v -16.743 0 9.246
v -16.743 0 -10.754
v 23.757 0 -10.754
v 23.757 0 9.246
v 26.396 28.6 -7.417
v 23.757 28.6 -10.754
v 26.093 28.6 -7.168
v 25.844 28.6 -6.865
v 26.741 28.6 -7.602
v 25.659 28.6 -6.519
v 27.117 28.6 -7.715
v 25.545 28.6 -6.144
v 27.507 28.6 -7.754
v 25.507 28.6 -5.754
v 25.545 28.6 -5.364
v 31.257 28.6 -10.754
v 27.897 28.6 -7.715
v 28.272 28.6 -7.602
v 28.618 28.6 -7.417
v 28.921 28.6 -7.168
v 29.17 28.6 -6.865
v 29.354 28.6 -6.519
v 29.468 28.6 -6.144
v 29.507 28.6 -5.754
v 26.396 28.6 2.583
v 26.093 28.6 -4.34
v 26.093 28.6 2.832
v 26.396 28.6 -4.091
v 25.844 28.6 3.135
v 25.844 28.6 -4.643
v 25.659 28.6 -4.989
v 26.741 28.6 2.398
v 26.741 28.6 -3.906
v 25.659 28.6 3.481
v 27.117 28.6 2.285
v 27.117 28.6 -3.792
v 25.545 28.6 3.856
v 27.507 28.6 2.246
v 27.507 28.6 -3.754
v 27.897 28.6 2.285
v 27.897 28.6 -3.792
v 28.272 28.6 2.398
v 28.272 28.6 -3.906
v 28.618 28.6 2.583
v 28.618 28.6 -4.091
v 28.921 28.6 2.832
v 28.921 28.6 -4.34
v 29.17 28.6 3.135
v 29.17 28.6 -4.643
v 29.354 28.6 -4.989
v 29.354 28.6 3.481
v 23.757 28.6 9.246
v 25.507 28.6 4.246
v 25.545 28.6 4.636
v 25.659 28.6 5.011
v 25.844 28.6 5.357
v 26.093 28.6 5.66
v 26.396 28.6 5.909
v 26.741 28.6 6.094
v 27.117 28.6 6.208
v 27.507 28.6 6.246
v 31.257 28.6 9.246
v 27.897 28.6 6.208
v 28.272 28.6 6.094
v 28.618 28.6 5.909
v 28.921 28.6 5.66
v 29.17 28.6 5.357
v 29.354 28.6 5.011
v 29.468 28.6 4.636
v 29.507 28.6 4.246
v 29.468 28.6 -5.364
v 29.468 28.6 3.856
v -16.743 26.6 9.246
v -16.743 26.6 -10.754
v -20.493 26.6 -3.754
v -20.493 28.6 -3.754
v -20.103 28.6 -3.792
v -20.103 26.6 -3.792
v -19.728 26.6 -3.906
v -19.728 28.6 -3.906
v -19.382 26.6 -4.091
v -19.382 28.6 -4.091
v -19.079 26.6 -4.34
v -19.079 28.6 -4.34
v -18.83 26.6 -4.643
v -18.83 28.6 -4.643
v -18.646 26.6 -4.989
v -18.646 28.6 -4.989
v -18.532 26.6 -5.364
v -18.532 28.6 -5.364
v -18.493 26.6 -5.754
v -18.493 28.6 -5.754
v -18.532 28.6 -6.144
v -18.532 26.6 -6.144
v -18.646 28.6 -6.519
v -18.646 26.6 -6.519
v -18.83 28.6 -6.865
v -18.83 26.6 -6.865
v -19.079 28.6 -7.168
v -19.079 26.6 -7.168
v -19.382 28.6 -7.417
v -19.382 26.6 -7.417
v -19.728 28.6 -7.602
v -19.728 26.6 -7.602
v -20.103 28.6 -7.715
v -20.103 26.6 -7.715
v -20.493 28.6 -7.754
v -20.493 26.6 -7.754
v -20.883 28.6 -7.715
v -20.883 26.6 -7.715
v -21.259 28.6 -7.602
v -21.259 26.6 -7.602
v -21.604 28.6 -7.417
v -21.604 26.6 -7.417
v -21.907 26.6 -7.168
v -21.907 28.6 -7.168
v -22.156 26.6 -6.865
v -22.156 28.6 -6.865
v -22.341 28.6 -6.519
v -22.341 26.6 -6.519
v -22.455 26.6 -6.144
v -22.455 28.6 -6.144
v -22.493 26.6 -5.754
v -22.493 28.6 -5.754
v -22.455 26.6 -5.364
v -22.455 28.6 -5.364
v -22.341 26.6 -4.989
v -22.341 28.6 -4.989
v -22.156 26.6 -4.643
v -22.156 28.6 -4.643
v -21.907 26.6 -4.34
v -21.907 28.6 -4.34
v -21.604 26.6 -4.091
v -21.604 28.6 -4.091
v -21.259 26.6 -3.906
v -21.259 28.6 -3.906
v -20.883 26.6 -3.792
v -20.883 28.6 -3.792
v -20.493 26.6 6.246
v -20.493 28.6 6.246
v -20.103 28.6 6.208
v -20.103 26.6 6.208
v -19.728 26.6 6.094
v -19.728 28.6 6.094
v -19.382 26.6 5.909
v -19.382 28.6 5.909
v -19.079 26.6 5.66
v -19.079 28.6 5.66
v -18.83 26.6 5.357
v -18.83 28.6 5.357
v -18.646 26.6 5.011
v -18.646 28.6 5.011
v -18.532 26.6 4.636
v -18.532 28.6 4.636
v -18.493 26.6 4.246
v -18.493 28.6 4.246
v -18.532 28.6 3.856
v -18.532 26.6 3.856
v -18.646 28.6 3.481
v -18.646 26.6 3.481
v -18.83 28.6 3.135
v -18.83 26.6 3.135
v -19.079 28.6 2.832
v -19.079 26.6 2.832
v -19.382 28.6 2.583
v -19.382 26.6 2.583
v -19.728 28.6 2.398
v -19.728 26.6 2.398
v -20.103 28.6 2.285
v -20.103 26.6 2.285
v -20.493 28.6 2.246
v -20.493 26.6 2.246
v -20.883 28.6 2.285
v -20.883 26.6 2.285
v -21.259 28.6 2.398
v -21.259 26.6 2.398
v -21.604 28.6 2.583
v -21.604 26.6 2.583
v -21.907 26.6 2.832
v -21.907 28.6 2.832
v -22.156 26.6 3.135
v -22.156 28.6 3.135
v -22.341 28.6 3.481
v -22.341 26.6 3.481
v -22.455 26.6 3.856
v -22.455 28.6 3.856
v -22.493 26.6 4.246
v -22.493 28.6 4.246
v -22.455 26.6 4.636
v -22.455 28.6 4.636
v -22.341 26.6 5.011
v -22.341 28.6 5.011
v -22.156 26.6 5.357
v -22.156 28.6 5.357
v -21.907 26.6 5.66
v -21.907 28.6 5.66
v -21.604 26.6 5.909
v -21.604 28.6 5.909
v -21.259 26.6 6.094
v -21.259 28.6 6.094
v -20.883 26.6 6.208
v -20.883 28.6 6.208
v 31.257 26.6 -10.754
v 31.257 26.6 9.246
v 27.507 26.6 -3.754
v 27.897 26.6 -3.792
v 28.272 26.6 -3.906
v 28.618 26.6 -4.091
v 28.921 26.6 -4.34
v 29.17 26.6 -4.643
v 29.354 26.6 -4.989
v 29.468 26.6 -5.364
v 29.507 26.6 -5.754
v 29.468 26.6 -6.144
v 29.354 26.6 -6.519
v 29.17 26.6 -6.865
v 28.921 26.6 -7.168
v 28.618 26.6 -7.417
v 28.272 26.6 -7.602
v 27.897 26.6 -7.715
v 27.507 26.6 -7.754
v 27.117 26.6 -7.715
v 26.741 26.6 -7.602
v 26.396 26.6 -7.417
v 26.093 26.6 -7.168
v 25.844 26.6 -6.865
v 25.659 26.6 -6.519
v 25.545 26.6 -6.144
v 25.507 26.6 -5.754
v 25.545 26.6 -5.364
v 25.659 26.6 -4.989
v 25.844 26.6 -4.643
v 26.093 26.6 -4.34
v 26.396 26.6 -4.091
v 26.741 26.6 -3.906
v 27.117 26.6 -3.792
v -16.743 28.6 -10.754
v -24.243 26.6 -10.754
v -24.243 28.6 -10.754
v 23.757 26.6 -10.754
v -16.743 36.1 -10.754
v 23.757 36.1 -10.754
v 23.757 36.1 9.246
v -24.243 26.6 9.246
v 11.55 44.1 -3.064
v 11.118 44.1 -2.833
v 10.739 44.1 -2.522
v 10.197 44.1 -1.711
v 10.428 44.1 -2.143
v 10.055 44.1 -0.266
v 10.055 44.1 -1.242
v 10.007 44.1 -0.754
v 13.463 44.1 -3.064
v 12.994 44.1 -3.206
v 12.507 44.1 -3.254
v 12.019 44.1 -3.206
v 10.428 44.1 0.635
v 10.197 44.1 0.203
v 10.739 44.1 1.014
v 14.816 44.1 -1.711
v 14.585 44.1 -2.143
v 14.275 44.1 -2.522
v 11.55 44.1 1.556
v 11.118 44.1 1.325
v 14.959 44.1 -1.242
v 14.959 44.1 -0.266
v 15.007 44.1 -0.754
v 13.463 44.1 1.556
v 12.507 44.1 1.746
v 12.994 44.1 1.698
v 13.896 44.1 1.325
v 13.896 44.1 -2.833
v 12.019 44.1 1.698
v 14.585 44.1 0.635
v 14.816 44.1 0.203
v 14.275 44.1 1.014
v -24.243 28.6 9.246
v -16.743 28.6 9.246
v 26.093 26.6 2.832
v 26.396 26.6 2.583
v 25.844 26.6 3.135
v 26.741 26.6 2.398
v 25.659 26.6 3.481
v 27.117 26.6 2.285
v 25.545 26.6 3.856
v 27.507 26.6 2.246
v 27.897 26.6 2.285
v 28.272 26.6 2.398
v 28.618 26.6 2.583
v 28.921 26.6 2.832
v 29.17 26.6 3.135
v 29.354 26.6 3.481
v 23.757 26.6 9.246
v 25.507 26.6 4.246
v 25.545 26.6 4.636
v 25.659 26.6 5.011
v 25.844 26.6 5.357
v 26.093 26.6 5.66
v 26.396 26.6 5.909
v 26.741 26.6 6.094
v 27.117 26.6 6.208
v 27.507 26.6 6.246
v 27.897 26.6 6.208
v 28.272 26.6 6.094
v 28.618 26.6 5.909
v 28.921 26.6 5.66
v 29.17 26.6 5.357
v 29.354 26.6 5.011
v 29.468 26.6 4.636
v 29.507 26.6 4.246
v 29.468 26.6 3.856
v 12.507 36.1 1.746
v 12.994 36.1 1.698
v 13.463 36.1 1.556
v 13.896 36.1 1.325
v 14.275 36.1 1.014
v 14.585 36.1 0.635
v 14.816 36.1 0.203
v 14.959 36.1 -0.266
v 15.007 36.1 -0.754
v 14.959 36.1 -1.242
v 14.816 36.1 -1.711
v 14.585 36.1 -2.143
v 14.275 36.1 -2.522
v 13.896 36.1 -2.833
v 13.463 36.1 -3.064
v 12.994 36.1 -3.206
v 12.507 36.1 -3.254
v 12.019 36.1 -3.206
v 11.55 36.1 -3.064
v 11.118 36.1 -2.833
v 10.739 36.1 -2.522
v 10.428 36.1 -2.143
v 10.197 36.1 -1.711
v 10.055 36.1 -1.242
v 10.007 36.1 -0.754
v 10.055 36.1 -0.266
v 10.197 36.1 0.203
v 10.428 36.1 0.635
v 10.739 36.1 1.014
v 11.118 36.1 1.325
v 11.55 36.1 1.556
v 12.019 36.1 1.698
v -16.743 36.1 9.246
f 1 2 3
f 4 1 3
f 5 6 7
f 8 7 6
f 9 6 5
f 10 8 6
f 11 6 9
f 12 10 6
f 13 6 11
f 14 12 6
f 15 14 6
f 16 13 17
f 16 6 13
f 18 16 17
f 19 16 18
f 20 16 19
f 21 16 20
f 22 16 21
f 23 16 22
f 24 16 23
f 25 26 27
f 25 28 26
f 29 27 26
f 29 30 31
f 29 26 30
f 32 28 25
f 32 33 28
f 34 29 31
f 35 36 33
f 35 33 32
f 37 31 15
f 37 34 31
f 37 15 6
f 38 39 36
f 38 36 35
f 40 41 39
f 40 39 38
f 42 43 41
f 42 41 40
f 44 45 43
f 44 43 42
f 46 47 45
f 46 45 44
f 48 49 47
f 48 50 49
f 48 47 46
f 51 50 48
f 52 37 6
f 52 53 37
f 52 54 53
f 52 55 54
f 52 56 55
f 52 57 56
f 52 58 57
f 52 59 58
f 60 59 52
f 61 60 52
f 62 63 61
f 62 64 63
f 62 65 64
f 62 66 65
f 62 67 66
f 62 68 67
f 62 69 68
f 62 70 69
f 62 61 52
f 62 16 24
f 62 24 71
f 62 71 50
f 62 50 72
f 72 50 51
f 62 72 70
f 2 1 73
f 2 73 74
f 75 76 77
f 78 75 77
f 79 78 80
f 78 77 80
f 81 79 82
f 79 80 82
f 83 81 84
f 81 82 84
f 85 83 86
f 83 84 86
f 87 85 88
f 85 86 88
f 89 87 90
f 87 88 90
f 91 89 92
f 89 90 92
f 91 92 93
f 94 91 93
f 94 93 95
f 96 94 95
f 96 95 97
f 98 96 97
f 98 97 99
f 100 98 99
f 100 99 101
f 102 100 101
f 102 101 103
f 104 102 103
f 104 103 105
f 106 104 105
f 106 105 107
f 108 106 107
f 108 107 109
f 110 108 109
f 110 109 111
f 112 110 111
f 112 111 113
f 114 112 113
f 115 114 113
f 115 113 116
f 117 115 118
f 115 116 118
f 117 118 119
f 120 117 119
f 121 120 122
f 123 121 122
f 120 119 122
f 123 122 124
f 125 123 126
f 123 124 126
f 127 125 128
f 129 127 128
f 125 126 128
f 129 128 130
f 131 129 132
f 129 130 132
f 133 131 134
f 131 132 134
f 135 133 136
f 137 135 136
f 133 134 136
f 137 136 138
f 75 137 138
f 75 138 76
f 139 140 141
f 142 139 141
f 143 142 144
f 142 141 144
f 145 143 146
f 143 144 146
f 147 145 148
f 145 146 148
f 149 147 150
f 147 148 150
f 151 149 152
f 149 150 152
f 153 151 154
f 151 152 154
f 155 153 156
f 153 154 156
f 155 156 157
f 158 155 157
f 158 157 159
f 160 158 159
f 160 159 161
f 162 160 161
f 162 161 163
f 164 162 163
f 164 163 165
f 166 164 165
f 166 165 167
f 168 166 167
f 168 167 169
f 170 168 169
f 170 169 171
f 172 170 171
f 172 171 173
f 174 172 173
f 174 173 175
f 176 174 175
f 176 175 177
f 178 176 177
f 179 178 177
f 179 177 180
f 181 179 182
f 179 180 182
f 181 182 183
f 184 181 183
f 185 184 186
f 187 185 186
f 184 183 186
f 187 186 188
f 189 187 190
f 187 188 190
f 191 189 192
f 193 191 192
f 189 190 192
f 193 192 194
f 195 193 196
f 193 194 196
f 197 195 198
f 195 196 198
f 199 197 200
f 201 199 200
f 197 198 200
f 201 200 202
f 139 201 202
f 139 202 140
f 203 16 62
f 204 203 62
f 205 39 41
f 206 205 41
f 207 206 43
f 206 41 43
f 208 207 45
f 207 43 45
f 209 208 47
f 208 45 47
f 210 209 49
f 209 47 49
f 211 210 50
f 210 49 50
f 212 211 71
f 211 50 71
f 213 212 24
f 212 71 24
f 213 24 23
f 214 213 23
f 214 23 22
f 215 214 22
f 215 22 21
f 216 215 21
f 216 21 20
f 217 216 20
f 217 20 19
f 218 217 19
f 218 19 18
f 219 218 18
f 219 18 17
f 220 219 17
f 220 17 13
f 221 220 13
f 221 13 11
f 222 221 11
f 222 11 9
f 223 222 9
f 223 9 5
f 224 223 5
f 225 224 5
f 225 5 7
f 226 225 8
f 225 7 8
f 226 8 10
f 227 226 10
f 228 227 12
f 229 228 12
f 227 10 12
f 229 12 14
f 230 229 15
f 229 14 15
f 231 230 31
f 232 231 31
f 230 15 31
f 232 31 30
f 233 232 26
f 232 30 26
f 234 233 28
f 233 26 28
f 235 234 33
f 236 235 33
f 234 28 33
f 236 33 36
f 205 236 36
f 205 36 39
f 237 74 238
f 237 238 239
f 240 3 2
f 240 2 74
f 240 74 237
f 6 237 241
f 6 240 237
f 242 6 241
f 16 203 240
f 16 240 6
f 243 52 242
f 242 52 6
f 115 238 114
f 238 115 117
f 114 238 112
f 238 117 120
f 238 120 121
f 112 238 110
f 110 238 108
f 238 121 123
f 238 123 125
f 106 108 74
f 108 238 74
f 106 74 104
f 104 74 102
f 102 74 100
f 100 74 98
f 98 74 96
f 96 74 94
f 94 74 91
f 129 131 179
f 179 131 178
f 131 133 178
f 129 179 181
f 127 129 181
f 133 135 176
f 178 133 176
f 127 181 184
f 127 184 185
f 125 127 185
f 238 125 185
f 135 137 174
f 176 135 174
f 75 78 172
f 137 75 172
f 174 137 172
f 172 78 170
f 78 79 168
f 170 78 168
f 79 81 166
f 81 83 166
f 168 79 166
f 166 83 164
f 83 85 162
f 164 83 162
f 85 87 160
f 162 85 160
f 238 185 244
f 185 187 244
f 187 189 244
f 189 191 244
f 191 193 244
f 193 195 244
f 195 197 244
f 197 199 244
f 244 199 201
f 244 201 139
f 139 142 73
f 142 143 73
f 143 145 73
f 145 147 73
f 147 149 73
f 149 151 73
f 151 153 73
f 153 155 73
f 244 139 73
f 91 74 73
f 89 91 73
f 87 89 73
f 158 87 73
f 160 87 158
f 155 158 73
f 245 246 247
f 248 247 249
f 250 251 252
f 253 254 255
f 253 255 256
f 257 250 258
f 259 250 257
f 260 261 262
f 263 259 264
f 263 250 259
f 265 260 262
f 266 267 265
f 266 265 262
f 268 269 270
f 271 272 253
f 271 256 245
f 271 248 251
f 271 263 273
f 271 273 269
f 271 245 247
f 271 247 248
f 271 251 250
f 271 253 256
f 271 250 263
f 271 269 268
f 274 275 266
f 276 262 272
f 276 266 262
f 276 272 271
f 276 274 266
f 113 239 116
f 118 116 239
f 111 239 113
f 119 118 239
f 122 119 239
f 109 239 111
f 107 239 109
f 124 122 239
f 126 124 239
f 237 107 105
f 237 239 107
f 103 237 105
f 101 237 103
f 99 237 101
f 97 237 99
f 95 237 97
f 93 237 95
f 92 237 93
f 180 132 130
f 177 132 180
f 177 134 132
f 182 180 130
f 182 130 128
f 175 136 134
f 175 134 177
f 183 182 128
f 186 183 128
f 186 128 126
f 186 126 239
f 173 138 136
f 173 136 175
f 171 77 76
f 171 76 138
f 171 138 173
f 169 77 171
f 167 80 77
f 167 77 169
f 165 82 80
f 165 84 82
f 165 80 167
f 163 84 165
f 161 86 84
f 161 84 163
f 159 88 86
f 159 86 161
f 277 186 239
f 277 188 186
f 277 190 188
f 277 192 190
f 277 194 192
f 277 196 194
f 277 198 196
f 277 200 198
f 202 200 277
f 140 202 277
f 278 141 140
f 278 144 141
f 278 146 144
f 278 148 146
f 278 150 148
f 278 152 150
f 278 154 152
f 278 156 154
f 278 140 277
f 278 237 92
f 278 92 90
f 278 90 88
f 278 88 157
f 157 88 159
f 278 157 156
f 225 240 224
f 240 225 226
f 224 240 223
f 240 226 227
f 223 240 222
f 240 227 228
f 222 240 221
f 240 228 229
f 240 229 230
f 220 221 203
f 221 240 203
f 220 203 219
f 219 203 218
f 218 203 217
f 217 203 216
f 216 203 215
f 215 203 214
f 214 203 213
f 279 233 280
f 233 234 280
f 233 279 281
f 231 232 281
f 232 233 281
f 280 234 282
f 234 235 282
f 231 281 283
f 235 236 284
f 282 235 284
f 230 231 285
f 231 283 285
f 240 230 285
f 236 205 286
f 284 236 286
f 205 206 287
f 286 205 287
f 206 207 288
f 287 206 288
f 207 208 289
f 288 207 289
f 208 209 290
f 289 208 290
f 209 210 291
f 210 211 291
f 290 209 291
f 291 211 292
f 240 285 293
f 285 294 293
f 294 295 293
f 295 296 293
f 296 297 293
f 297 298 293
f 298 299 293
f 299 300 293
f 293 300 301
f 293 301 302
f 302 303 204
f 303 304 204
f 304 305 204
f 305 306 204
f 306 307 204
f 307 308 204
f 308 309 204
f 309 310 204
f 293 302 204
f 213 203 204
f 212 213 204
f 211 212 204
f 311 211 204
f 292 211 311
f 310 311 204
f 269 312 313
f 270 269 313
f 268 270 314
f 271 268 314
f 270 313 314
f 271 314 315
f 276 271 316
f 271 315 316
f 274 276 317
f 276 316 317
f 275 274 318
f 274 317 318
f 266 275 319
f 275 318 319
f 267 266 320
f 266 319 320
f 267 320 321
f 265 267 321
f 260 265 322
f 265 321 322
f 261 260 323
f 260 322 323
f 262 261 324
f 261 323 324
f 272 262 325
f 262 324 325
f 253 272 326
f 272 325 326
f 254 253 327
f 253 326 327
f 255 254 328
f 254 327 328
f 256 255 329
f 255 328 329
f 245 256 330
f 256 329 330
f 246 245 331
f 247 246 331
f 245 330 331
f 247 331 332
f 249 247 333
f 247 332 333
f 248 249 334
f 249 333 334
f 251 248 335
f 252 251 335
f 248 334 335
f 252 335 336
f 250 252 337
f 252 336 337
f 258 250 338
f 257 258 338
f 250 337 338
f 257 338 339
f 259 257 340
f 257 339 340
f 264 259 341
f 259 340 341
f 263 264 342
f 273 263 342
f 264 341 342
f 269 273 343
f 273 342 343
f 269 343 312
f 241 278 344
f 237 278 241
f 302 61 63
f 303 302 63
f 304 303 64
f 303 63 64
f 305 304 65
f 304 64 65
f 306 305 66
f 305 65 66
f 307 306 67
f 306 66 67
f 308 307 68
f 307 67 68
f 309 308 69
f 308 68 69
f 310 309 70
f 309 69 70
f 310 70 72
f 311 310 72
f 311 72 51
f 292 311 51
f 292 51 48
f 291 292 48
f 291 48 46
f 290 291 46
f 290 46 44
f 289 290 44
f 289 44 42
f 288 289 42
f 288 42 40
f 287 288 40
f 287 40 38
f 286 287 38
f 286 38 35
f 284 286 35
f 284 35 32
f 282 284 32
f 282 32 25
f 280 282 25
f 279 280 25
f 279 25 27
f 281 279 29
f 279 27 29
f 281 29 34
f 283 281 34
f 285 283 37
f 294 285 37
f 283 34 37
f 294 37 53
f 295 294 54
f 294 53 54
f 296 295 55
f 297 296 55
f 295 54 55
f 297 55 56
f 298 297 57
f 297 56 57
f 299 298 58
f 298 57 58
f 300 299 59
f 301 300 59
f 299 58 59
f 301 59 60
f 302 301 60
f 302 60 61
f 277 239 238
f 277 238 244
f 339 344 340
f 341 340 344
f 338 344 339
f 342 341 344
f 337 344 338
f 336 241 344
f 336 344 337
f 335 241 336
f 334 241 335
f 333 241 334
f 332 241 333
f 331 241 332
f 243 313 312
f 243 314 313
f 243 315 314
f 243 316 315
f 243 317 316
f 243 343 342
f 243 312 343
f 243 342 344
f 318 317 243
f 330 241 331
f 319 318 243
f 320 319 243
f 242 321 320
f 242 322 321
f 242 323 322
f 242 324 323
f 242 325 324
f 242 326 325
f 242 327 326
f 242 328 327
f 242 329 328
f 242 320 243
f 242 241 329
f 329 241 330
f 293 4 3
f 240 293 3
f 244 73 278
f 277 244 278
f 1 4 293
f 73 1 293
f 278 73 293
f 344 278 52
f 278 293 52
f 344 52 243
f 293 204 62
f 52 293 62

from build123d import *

# Parameters (mm, degrees)
SKETCH1_W                = 40.5
SKETCH1_H                = 20
BOSS_EXTRUDE1_DEPTH      = 36.1
SKETCH2_R                = 2.5
BOSS_EXTRUDE2_DEPTH      = 8
BOSS_EXTRUDE3_DEPTH      = 7.5
BOSS_EXTRUDE3_DEPTH_BACK = 48
SKETCH3_W                = 20
SKETCH3_H                = 2
SKETCH4_R                = 2
CUT_EXTRUDE1_DEPTH       = 7.5


with BuildPart() as part:
    # Sketch1 → Boss-Extrude1 (new body)
    with BuildSketch(Plane(origin=(0, 0, 0), x_dir=(1, 0, 0), z_dir=(0, 1, 0))):
        with Locations((3.506737992, 0.753901676)):
            Rectangle(SKETCH1_W, SKETCH1_H)
    extrude(amount=BOSS_EXTRUDE1_DEPTH)

    # Sketch2 → Boss-Extrude2 (add)
    with BuildSketch(Plane(origin=(0, 36.1, 0), x_dir=(1, 0, 0), z_dir=(0, 1, 0))):
        with Locations(Location((12.506737992, 0.753901676, 0), (0, 0, 270))):
            Circle(SKETCH2_R)
    extrude(amount=BOSS_EXTRUDE2_DEPTH)

    # Sketch3 → Boss-Extrude3 (add, two sides: drawn at the far end of the back side and taken through both)
    with BuildSketch(Plane.ZY.offset(16.743262008).offset(-BOSS_EXTRUDE3_DEPTH_BACK)):
        with Locations((-0.753901676, 27.6)):
            Rectangle(SKETCH3_W, SKETCH3_H)
    extrude(amount=BOSS_EXTRUDE3_DEPTH + BOSS_EXTRUDE3_DEPTH_BACK)

    # Sketch4 → Cut-Extrude1 (cut)
    with BuildSketch(Plane(origin=(0, 28.6, 0), x_dir=(1, 0, 0), z_dir=(0, 1, 0))):
        with Locations(Location((-20.493262008, 5.753901676, 0), (0, 0, 270))):
            Circle(SKETCH4_R)
        with Locations(Location((27.506737992, 5.753901676, 0), (0, 0, 270))):
            Circle(SKETCH4_R)
        with Locations(Location((-20.493262008, -4.246098324, 0), (0, 0, 270))):
            Circle(SKETCH4_R)
        with Locations(Location((27.506737992, -4.246098324, 0), (0, 0, 270))):
            Circle(SKETCH4_R)
    extrude(amount=-CUT_EXTRUDE1_DEPTH, mode=Mode.SUBTRACT)


solid = part.part
